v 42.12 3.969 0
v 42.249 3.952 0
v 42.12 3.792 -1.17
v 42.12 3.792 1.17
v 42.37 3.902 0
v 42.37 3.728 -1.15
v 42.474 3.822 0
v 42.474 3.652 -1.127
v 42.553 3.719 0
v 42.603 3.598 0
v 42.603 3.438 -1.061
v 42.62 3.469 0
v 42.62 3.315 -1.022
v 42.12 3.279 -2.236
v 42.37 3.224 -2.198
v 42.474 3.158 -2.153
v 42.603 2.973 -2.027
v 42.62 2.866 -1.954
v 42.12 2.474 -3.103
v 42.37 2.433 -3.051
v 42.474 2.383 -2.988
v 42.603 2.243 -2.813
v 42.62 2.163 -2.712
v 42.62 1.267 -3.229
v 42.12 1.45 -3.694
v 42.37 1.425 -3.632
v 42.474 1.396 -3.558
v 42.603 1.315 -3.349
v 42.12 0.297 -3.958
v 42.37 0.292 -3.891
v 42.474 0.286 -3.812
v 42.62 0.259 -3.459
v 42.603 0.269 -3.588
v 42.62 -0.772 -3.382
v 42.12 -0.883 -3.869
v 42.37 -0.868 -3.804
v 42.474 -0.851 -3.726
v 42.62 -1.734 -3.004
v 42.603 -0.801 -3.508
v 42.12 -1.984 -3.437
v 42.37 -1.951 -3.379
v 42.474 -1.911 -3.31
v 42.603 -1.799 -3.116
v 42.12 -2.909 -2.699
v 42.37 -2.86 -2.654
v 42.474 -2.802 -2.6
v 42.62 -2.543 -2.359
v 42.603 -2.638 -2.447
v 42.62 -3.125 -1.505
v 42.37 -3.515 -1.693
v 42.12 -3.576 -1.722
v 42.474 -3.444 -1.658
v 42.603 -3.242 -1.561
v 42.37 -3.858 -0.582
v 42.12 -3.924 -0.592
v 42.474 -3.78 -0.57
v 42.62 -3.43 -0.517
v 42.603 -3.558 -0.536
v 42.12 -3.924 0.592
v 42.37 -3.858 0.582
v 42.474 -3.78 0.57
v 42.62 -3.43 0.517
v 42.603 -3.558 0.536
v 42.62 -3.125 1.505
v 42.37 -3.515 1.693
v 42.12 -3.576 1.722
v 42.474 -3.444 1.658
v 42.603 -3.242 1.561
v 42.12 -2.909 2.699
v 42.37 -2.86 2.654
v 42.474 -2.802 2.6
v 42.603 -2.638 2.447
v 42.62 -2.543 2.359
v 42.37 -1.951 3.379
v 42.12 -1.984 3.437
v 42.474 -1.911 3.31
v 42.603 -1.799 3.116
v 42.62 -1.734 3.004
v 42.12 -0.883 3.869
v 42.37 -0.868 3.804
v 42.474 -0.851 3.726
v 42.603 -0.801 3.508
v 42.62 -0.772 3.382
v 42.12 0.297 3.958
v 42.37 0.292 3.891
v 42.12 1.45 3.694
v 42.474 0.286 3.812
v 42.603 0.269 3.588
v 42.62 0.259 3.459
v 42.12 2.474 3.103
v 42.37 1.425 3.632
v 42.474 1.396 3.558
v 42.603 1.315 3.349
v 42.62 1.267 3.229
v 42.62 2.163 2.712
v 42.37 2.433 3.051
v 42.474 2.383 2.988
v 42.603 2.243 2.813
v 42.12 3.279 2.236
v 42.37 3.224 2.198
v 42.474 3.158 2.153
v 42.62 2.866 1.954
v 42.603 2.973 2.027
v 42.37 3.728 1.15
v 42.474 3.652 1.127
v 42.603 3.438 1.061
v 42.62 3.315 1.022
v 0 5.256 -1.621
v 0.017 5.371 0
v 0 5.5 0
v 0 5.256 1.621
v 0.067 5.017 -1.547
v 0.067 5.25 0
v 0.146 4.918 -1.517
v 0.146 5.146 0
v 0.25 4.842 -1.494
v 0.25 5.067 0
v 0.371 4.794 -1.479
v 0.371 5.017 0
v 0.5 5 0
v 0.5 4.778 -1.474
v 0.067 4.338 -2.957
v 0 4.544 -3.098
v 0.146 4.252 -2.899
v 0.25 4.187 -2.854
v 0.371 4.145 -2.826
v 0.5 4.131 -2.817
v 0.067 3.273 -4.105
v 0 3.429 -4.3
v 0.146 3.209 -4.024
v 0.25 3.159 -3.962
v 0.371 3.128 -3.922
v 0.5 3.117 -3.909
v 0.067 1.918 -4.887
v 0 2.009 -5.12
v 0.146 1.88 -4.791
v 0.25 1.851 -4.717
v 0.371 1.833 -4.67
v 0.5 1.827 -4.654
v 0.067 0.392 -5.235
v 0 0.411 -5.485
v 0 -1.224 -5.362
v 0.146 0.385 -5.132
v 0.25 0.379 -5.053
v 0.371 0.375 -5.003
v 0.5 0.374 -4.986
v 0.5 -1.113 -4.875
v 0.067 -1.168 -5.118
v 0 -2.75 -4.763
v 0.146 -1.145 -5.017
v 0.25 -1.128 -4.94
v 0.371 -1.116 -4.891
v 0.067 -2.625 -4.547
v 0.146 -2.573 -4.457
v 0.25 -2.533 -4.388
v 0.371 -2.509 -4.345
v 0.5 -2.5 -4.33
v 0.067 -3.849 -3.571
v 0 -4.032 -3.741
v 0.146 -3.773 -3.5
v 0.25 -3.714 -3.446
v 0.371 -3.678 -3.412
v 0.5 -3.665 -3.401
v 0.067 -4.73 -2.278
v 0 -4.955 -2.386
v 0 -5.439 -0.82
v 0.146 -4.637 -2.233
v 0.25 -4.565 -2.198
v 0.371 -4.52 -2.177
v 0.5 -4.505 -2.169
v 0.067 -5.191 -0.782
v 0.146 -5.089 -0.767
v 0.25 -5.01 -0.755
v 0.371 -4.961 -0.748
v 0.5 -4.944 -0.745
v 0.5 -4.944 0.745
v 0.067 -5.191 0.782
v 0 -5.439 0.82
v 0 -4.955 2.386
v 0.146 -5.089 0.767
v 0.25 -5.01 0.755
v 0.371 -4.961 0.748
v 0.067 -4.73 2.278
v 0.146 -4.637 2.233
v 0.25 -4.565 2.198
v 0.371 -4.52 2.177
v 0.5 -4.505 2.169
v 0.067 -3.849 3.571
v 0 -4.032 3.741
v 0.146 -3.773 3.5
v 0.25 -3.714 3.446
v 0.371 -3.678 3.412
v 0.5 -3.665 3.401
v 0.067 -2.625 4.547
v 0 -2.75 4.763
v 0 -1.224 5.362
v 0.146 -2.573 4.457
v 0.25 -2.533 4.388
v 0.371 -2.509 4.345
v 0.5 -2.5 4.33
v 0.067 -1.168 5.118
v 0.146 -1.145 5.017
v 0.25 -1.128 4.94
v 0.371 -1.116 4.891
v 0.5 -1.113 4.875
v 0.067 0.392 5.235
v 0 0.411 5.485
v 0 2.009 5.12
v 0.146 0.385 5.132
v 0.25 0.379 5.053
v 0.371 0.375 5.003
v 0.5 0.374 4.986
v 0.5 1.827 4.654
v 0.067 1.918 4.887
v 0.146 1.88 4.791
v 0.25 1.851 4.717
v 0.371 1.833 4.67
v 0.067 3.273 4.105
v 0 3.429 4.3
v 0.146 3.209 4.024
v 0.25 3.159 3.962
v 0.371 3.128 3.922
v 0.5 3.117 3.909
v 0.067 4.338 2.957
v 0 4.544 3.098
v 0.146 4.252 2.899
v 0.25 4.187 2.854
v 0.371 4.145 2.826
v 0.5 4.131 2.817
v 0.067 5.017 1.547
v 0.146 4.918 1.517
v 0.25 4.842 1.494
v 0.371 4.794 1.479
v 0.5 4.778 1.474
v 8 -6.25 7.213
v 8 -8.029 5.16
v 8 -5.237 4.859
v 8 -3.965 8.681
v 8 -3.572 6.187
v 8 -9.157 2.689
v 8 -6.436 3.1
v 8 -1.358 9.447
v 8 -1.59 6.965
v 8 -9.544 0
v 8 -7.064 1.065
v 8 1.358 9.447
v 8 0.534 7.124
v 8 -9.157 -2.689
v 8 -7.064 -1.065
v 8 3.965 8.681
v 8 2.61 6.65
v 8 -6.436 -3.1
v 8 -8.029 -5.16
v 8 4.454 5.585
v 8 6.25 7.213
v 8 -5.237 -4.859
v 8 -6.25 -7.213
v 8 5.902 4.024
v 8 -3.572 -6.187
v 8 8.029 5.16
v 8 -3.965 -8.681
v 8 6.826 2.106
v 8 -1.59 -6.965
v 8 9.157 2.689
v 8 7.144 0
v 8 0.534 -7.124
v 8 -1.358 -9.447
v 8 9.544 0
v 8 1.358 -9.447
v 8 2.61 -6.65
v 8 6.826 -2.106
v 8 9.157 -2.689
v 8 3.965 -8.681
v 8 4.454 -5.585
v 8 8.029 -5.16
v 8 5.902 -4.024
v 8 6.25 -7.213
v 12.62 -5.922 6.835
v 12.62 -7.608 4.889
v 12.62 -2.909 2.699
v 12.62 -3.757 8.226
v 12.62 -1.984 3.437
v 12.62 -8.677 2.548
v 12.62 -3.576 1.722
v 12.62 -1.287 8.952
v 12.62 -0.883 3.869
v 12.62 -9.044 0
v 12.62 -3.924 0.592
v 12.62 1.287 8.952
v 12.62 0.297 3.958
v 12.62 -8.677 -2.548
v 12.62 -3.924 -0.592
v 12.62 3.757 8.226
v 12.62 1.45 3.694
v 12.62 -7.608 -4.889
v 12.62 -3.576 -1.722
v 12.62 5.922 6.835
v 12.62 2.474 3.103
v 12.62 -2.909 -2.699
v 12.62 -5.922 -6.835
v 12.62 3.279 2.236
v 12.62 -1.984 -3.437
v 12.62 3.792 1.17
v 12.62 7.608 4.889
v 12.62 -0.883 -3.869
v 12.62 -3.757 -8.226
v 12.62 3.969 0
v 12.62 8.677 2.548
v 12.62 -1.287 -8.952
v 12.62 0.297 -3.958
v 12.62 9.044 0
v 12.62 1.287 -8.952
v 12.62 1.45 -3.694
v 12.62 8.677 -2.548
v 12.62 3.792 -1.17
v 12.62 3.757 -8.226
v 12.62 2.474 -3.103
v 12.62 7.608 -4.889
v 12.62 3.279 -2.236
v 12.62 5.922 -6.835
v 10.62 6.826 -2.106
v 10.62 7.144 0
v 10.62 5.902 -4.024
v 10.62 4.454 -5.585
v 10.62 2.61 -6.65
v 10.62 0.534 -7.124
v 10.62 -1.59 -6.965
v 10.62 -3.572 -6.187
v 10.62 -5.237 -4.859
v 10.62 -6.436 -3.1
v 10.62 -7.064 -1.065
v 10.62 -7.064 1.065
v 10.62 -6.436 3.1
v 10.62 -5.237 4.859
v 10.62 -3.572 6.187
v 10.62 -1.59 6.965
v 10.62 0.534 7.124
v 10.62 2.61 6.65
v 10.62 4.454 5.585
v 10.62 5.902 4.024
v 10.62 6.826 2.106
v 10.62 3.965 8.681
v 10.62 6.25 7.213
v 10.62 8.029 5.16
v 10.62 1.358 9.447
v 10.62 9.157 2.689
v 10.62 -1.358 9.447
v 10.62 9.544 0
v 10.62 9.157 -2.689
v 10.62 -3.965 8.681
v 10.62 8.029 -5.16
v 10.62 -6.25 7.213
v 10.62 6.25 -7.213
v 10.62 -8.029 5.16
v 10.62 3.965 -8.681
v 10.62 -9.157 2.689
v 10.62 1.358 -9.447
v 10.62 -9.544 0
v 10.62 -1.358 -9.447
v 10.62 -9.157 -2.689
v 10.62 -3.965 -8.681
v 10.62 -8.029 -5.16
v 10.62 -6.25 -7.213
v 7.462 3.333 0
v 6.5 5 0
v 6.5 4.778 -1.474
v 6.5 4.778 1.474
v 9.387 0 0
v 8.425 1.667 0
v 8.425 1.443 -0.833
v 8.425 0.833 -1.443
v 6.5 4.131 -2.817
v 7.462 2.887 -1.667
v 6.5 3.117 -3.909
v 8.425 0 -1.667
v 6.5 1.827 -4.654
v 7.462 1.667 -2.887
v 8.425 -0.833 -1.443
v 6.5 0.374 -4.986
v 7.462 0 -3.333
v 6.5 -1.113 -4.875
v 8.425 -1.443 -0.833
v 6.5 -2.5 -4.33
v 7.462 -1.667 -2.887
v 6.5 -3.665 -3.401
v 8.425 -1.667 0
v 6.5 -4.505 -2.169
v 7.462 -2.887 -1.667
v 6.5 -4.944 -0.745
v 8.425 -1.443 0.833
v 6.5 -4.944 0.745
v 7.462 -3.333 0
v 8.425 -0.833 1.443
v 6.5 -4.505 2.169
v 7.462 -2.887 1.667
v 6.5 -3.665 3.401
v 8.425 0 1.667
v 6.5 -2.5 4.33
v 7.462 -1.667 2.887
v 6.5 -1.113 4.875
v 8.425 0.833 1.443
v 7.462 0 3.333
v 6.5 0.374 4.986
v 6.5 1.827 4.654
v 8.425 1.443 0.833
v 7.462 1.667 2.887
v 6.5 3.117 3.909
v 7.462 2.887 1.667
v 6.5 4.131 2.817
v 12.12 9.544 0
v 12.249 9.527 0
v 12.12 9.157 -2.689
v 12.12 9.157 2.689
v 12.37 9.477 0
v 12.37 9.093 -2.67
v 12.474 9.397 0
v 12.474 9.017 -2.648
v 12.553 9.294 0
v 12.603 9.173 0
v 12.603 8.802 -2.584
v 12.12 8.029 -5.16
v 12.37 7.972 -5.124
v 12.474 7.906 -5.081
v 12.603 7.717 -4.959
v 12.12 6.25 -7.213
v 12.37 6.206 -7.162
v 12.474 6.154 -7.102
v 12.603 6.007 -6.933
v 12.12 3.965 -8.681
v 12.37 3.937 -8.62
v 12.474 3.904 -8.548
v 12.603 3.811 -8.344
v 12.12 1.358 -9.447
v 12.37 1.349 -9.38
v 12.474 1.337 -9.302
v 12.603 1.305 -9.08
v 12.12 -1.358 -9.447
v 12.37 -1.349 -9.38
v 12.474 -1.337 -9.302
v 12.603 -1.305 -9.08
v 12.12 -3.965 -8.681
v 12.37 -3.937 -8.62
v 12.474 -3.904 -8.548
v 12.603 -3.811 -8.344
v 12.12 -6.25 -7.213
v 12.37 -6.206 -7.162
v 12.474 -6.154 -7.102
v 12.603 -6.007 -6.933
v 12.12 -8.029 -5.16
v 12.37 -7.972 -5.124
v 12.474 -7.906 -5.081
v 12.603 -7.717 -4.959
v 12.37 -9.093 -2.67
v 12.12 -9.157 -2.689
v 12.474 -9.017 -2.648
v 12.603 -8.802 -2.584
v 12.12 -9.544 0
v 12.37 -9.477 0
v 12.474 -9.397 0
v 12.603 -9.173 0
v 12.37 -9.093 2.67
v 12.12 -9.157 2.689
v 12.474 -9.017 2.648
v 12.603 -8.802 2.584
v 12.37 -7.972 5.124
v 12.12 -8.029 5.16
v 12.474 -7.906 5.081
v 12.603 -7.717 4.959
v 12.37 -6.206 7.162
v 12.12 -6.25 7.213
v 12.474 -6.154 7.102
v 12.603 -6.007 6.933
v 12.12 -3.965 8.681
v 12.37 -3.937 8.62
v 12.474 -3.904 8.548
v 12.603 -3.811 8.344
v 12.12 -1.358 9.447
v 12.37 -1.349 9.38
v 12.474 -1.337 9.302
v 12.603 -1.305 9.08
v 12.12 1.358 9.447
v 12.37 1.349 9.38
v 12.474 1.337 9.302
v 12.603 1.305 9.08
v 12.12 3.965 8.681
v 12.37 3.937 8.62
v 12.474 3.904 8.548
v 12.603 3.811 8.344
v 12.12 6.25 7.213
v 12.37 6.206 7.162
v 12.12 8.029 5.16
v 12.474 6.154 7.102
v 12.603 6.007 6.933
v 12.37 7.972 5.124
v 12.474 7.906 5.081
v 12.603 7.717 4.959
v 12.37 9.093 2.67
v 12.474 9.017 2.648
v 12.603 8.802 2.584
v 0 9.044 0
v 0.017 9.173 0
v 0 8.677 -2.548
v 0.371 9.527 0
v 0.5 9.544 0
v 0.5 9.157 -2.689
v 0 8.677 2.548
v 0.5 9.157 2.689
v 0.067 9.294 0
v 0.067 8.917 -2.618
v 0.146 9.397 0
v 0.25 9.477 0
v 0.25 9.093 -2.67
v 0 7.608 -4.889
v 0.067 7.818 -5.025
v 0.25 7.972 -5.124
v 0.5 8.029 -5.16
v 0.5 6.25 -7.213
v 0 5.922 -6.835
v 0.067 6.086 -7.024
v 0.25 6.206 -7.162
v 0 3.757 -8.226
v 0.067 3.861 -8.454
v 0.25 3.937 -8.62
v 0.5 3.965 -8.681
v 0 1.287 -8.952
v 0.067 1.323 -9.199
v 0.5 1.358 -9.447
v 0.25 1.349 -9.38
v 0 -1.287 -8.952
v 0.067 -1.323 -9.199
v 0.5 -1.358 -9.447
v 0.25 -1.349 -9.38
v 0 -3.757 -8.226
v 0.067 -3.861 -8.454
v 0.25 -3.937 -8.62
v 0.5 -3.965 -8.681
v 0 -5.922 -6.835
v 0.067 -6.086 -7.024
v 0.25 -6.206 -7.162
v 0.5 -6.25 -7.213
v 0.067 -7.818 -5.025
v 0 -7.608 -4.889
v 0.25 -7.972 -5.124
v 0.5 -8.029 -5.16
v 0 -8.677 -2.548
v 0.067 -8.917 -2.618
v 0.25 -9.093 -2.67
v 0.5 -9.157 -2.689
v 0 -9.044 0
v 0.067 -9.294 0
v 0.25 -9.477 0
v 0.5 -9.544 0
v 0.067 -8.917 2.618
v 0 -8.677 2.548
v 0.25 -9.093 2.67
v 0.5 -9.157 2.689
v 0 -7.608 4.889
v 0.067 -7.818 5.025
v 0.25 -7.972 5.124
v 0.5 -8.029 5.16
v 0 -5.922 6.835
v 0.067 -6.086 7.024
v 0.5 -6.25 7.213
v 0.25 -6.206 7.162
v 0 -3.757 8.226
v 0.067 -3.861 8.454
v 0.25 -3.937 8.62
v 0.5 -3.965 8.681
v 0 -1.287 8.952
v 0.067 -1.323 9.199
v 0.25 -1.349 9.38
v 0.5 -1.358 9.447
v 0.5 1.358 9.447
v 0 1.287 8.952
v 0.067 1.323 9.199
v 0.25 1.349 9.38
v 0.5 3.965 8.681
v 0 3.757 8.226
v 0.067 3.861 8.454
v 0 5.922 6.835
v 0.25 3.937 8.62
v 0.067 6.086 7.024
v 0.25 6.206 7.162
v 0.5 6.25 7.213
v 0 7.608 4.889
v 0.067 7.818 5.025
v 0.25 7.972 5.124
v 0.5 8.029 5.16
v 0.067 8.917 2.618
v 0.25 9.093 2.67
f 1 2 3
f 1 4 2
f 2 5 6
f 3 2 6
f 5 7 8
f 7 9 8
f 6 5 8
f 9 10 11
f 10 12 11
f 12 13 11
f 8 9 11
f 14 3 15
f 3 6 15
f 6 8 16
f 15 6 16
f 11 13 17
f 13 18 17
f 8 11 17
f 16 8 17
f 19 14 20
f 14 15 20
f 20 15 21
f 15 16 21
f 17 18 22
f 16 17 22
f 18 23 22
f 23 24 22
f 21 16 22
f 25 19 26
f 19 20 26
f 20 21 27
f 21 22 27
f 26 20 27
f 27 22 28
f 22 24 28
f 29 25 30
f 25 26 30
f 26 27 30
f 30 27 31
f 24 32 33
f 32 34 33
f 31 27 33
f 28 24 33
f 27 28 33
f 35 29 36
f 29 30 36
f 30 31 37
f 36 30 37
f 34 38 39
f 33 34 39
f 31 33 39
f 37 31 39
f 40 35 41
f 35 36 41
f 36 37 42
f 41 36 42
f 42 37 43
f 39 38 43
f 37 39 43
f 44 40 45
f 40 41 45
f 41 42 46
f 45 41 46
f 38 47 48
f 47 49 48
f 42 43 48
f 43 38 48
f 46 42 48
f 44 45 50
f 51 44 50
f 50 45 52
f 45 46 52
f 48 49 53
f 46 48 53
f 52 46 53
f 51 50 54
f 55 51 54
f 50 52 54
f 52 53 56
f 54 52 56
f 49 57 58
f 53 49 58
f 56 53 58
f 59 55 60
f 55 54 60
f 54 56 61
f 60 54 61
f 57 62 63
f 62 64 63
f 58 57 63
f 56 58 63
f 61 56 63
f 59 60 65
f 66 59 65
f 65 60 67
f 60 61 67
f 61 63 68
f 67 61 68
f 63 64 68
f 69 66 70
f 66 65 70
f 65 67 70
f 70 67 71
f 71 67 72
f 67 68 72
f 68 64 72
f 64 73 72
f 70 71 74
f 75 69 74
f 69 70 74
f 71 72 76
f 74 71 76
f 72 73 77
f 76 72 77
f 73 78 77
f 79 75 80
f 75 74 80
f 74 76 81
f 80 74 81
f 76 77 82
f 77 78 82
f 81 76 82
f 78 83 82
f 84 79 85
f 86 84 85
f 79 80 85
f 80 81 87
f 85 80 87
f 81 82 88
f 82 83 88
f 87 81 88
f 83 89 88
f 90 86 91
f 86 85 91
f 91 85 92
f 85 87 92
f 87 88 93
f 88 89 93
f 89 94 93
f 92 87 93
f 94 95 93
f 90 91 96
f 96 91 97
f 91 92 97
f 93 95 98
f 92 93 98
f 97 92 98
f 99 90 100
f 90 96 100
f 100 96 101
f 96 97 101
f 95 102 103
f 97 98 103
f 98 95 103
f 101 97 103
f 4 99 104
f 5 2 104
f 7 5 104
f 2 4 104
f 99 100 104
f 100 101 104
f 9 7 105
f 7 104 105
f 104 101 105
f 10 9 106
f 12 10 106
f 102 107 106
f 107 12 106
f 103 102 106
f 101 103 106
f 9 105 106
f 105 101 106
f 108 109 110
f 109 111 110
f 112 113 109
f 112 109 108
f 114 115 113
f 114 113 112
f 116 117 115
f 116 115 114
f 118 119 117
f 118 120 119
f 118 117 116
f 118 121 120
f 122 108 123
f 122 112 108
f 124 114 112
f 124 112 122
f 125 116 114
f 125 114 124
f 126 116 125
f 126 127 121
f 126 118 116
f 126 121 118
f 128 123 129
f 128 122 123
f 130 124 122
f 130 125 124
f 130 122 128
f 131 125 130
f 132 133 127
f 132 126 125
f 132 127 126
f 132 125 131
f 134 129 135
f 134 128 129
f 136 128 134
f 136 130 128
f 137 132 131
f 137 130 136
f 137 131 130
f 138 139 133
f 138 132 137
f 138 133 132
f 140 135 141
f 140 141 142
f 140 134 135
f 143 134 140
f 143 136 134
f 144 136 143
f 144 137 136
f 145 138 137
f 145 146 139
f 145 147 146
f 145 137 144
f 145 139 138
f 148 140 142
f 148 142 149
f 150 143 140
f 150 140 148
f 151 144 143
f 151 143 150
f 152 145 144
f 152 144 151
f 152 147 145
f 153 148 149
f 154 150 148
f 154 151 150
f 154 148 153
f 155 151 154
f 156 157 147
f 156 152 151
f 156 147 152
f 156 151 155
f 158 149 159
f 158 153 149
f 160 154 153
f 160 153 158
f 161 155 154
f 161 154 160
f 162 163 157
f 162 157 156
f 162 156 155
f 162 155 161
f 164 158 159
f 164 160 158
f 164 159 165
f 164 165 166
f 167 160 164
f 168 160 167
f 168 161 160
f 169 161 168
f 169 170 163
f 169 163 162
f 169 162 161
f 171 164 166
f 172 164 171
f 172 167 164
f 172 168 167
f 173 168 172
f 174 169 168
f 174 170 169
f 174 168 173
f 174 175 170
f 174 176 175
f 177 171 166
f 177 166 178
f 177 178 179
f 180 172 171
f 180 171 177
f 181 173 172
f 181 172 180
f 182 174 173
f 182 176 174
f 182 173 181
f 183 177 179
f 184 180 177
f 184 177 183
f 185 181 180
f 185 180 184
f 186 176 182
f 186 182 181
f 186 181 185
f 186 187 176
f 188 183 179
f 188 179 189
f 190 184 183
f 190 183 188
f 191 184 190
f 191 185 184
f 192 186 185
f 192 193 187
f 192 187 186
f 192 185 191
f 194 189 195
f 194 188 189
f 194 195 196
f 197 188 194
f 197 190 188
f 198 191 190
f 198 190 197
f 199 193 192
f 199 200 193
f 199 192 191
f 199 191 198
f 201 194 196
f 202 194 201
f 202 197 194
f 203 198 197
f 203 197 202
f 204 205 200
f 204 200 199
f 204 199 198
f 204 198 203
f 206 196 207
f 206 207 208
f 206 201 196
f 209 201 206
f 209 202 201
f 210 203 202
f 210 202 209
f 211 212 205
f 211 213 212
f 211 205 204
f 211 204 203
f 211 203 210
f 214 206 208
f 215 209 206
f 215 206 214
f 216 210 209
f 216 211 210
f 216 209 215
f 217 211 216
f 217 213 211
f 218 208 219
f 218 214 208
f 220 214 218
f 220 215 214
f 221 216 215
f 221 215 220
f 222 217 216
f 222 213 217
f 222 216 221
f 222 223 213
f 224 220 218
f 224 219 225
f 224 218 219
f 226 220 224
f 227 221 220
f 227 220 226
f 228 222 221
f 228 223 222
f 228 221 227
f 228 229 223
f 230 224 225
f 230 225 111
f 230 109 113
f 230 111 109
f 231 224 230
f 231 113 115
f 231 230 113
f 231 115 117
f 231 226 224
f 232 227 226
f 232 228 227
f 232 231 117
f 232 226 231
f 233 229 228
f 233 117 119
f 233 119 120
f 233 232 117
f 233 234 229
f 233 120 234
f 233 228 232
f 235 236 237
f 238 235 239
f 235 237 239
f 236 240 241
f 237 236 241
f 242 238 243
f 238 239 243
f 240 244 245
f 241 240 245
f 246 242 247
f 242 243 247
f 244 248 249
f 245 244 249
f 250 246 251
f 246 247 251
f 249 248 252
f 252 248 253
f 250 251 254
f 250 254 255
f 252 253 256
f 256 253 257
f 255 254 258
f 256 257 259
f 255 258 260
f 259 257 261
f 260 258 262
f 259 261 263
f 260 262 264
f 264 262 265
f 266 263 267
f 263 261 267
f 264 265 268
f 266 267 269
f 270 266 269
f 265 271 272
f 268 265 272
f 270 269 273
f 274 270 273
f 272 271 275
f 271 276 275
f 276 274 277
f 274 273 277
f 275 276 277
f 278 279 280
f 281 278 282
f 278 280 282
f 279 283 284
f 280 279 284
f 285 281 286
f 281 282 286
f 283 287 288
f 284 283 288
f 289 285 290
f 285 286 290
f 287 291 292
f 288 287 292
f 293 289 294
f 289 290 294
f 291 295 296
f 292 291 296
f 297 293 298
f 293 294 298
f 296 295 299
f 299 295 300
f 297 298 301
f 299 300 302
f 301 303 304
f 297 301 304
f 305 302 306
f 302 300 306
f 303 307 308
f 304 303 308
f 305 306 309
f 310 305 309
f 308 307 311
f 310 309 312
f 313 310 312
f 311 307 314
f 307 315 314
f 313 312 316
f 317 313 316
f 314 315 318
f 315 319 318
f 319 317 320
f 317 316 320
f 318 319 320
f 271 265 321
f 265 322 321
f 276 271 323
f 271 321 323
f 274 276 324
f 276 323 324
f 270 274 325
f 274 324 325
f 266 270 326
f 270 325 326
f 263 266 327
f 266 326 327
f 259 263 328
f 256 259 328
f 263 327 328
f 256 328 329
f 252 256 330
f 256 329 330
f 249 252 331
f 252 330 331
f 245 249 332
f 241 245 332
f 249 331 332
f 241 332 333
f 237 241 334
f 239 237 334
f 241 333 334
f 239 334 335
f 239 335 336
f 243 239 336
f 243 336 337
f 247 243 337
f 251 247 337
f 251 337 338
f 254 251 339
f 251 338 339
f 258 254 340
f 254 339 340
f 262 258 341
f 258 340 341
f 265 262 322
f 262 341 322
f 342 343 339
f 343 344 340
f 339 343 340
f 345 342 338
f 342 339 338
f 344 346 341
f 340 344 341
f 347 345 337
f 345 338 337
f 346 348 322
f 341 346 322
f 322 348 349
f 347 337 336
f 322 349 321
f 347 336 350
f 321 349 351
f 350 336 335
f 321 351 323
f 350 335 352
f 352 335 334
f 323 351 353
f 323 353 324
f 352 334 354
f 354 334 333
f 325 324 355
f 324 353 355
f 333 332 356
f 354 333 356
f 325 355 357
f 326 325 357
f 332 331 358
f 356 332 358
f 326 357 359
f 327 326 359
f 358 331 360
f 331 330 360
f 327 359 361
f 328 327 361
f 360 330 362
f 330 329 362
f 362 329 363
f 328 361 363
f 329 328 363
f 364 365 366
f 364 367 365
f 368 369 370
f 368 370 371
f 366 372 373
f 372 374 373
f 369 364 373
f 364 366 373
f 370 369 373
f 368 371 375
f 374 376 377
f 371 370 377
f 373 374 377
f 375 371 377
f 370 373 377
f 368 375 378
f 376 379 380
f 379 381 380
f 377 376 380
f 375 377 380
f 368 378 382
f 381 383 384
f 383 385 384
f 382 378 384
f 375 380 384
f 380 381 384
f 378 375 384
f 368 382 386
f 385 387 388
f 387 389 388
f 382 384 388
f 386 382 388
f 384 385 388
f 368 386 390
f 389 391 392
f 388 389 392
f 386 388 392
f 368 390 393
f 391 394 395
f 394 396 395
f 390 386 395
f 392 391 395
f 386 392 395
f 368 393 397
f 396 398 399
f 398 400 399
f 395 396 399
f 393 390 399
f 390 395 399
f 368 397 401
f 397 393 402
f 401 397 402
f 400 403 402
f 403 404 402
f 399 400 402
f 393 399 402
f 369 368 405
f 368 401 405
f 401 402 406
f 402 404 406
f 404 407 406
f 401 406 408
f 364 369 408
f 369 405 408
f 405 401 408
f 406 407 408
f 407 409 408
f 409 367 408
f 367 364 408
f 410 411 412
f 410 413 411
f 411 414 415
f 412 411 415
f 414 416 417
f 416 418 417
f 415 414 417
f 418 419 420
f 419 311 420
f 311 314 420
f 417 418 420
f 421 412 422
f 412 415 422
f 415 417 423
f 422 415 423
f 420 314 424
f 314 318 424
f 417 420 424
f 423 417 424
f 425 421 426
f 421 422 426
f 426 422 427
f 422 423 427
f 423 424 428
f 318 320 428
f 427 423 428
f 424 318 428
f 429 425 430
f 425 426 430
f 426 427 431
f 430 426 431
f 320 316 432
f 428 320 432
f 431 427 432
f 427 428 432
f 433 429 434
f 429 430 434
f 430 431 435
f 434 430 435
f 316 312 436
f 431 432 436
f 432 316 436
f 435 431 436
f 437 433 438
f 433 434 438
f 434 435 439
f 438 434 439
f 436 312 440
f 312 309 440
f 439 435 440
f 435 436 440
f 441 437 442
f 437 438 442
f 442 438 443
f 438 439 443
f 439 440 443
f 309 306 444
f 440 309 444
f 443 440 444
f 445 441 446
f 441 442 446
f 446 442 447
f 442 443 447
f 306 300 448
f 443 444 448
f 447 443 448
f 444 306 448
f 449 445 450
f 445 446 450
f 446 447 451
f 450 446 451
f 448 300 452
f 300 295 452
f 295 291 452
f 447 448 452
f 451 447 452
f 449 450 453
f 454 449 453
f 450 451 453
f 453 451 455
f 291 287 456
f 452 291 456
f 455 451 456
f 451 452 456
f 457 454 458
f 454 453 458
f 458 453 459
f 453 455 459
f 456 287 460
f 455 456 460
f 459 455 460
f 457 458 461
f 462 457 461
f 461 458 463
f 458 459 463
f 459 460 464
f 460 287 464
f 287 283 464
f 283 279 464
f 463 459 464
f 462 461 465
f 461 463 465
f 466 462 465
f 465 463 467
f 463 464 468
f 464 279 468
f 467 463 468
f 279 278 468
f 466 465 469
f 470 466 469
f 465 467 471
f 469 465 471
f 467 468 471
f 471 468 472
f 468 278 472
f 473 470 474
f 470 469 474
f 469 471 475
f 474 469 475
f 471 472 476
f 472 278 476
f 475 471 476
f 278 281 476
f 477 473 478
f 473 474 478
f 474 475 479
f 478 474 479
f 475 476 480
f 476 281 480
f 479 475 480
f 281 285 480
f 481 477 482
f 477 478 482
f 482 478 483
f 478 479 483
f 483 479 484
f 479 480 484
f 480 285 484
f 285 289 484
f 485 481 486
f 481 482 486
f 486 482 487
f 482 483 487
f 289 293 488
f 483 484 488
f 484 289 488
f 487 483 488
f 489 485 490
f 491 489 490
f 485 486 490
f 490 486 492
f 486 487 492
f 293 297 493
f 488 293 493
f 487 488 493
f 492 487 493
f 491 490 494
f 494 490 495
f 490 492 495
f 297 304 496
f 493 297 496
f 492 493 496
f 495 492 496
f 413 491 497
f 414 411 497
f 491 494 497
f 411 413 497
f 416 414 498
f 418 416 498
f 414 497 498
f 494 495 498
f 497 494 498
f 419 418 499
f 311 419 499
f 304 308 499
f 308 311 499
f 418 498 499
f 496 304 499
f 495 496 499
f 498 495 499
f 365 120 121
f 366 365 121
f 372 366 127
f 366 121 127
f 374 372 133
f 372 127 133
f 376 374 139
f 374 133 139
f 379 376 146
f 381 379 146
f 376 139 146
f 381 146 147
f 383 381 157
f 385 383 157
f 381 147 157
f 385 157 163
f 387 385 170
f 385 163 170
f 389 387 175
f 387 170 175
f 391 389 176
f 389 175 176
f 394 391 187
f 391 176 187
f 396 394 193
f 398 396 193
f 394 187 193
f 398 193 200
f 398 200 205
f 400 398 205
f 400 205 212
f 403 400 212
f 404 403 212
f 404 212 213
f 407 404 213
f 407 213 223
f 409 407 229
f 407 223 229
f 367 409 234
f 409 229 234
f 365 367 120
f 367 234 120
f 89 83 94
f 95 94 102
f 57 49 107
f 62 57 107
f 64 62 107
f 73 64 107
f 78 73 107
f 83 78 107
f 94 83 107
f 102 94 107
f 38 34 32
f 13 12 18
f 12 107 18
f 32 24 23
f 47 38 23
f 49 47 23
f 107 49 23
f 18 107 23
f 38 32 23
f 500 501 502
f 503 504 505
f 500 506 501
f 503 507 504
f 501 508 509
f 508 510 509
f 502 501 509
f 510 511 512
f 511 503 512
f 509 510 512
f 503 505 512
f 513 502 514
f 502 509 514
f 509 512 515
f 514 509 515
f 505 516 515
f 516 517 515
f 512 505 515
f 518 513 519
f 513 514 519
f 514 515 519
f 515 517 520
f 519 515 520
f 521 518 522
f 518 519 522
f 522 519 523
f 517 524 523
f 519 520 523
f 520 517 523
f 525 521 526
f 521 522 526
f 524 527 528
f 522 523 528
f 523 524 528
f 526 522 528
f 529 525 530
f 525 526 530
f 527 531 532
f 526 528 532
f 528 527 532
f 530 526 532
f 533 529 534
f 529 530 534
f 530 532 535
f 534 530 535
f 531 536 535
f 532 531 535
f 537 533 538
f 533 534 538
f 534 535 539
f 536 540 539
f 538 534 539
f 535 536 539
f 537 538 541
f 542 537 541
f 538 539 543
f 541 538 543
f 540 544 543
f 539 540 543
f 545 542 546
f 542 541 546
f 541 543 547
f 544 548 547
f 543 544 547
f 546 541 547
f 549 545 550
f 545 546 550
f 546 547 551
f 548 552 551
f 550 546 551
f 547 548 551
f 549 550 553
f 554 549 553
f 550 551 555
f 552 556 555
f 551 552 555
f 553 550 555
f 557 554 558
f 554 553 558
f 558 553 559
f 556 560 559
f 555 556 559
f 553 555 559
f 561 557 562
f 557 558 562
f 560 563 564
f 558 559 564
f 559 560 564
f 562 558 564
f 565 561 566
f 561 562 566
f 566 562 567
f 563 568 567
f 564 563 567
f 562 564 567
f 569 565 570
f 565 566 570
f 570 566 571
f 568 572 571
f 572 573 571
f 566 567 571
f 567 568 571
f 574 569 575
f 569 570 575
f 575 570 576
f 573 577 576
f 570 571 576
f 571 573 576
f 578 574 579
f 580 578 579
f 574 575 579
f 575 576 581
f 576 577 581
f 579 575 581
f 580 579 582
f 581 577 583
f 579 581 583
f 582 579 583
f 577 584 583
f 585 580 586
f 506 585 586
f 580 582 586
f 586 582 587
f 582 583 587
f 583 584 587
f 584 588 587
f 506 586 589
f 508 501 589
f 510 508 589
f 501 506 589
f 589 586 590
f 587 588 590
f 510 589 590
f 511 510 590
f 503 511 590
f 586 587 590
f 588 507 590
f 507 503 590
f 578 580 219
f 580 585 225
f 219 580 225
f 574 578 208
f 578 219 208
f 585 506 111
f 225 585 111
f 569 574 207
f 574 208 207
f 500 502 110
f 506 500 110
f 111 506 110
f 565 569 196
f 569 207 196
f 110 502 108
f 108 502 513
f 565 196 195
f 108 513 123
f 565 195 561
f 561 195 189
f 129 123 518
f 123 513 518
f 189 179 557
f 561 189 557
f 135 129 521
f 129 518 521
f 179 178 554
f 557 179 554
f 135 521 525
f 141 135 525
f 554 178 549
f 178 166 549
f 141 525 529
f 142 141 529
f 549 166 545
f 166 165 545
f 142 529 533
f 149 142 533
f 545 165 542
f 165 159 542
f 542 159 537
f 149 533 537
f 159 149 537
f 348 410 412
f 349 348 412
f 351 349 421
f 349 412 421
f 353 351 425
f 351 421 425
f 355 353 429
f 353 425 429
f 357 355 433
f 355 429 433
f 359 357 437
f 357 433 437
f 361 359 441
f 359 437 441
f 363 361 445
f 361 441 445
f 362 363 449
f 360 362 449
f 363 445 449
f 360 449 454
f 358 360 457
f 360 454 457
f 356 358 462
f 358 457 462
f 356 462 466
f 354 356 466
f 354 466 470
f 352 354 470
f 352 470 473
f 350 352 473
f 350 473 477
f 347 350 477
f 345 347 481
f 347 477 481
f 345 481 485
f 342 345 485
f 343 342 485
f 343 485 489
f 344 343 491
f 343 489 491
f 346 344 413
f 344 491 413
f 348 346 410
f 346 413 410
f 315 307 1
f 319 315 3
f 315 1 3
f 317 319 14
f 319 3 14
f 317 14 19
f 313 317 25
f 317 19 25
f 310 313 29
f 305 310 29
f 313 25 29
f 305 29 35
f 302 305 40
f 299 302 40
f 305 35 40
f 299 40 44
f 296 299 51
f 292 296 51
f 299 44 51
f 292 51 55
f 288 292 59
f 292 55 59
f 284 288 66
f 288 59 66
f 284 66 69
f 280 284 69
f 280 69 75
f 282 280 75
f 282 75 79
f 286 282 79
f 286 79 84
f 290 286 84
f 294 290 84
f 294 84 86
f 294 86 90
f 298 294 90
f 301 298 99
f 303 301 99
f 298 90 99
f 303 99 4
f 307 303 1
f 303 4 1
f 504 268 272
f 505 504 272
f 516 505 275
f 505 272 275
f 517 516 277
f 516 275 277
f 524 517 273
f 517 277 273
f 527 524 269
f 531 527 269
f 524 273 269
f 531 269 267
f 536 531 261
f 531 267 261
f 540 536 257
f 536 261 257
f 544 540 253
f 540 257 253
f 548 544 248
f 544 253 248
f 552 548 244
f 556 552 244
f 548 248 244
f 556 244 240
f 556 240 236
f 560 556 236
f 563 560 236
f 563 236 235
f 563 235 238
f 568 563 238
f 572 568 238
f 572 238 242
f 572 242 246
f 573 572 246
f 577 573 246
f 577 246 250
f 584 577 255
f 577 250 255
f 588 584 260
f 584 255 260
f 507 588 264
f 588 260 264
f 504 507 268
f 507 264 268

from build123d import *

# Parameters (mm, degrees)
FILETE1_R = 0.5
FILETE2_R = 0.5
FILETE3_R = 0.5
FILETE4_R = 0.5


with BuildPart() as part:
    # Esboço1 → Revolução1 (revolve)
    with BuildSketch(Plane.XY):
        Polygon((0, 5), (0, 9.54375), (8, 9.54375), (8, 7.14375), (10.62, 7.14375), (10.62, 9.54375), (12.62, 9.54375), (12.62, 3.96875), (42.62, 3.96875), (42.62, 0), (9.386751346, 0), (6.5, 5), align=None)
    revolve(axis=Axis((42.62, 0, 0), (-1, 0, 0)))

    # Filete1
    filete1_edges = [part.edges().sort_by_distance(p)[0] for p in [
        (42.62, -3.96875, 0),
    ]]
    fillet(filete1_edges, radius=FILETE1_R)

    # Filete2
    filete2_edges = [part.edges().sort_by_distance(p)[0] for p in [
        (0, -5, 0),
    ]]
    fillet(filete2_edges, radius=FILETE2_R)

    # Filete3
    filete3_edges = [part.edges().sort_by_distance(p)[0] for p in [
        (0, -9.54375, 0),
    ]]
    fillet(filete3_edges, radius=FILETE3_R)

    # Filete4
    filete4_edges = [part.edges().sort_by_distance(p)[0] for p in [
        (12.62, -9.54375, 0),
    ]]
    fillet(filete4_edges, radius=FILETE4_R)


solid = part.part
